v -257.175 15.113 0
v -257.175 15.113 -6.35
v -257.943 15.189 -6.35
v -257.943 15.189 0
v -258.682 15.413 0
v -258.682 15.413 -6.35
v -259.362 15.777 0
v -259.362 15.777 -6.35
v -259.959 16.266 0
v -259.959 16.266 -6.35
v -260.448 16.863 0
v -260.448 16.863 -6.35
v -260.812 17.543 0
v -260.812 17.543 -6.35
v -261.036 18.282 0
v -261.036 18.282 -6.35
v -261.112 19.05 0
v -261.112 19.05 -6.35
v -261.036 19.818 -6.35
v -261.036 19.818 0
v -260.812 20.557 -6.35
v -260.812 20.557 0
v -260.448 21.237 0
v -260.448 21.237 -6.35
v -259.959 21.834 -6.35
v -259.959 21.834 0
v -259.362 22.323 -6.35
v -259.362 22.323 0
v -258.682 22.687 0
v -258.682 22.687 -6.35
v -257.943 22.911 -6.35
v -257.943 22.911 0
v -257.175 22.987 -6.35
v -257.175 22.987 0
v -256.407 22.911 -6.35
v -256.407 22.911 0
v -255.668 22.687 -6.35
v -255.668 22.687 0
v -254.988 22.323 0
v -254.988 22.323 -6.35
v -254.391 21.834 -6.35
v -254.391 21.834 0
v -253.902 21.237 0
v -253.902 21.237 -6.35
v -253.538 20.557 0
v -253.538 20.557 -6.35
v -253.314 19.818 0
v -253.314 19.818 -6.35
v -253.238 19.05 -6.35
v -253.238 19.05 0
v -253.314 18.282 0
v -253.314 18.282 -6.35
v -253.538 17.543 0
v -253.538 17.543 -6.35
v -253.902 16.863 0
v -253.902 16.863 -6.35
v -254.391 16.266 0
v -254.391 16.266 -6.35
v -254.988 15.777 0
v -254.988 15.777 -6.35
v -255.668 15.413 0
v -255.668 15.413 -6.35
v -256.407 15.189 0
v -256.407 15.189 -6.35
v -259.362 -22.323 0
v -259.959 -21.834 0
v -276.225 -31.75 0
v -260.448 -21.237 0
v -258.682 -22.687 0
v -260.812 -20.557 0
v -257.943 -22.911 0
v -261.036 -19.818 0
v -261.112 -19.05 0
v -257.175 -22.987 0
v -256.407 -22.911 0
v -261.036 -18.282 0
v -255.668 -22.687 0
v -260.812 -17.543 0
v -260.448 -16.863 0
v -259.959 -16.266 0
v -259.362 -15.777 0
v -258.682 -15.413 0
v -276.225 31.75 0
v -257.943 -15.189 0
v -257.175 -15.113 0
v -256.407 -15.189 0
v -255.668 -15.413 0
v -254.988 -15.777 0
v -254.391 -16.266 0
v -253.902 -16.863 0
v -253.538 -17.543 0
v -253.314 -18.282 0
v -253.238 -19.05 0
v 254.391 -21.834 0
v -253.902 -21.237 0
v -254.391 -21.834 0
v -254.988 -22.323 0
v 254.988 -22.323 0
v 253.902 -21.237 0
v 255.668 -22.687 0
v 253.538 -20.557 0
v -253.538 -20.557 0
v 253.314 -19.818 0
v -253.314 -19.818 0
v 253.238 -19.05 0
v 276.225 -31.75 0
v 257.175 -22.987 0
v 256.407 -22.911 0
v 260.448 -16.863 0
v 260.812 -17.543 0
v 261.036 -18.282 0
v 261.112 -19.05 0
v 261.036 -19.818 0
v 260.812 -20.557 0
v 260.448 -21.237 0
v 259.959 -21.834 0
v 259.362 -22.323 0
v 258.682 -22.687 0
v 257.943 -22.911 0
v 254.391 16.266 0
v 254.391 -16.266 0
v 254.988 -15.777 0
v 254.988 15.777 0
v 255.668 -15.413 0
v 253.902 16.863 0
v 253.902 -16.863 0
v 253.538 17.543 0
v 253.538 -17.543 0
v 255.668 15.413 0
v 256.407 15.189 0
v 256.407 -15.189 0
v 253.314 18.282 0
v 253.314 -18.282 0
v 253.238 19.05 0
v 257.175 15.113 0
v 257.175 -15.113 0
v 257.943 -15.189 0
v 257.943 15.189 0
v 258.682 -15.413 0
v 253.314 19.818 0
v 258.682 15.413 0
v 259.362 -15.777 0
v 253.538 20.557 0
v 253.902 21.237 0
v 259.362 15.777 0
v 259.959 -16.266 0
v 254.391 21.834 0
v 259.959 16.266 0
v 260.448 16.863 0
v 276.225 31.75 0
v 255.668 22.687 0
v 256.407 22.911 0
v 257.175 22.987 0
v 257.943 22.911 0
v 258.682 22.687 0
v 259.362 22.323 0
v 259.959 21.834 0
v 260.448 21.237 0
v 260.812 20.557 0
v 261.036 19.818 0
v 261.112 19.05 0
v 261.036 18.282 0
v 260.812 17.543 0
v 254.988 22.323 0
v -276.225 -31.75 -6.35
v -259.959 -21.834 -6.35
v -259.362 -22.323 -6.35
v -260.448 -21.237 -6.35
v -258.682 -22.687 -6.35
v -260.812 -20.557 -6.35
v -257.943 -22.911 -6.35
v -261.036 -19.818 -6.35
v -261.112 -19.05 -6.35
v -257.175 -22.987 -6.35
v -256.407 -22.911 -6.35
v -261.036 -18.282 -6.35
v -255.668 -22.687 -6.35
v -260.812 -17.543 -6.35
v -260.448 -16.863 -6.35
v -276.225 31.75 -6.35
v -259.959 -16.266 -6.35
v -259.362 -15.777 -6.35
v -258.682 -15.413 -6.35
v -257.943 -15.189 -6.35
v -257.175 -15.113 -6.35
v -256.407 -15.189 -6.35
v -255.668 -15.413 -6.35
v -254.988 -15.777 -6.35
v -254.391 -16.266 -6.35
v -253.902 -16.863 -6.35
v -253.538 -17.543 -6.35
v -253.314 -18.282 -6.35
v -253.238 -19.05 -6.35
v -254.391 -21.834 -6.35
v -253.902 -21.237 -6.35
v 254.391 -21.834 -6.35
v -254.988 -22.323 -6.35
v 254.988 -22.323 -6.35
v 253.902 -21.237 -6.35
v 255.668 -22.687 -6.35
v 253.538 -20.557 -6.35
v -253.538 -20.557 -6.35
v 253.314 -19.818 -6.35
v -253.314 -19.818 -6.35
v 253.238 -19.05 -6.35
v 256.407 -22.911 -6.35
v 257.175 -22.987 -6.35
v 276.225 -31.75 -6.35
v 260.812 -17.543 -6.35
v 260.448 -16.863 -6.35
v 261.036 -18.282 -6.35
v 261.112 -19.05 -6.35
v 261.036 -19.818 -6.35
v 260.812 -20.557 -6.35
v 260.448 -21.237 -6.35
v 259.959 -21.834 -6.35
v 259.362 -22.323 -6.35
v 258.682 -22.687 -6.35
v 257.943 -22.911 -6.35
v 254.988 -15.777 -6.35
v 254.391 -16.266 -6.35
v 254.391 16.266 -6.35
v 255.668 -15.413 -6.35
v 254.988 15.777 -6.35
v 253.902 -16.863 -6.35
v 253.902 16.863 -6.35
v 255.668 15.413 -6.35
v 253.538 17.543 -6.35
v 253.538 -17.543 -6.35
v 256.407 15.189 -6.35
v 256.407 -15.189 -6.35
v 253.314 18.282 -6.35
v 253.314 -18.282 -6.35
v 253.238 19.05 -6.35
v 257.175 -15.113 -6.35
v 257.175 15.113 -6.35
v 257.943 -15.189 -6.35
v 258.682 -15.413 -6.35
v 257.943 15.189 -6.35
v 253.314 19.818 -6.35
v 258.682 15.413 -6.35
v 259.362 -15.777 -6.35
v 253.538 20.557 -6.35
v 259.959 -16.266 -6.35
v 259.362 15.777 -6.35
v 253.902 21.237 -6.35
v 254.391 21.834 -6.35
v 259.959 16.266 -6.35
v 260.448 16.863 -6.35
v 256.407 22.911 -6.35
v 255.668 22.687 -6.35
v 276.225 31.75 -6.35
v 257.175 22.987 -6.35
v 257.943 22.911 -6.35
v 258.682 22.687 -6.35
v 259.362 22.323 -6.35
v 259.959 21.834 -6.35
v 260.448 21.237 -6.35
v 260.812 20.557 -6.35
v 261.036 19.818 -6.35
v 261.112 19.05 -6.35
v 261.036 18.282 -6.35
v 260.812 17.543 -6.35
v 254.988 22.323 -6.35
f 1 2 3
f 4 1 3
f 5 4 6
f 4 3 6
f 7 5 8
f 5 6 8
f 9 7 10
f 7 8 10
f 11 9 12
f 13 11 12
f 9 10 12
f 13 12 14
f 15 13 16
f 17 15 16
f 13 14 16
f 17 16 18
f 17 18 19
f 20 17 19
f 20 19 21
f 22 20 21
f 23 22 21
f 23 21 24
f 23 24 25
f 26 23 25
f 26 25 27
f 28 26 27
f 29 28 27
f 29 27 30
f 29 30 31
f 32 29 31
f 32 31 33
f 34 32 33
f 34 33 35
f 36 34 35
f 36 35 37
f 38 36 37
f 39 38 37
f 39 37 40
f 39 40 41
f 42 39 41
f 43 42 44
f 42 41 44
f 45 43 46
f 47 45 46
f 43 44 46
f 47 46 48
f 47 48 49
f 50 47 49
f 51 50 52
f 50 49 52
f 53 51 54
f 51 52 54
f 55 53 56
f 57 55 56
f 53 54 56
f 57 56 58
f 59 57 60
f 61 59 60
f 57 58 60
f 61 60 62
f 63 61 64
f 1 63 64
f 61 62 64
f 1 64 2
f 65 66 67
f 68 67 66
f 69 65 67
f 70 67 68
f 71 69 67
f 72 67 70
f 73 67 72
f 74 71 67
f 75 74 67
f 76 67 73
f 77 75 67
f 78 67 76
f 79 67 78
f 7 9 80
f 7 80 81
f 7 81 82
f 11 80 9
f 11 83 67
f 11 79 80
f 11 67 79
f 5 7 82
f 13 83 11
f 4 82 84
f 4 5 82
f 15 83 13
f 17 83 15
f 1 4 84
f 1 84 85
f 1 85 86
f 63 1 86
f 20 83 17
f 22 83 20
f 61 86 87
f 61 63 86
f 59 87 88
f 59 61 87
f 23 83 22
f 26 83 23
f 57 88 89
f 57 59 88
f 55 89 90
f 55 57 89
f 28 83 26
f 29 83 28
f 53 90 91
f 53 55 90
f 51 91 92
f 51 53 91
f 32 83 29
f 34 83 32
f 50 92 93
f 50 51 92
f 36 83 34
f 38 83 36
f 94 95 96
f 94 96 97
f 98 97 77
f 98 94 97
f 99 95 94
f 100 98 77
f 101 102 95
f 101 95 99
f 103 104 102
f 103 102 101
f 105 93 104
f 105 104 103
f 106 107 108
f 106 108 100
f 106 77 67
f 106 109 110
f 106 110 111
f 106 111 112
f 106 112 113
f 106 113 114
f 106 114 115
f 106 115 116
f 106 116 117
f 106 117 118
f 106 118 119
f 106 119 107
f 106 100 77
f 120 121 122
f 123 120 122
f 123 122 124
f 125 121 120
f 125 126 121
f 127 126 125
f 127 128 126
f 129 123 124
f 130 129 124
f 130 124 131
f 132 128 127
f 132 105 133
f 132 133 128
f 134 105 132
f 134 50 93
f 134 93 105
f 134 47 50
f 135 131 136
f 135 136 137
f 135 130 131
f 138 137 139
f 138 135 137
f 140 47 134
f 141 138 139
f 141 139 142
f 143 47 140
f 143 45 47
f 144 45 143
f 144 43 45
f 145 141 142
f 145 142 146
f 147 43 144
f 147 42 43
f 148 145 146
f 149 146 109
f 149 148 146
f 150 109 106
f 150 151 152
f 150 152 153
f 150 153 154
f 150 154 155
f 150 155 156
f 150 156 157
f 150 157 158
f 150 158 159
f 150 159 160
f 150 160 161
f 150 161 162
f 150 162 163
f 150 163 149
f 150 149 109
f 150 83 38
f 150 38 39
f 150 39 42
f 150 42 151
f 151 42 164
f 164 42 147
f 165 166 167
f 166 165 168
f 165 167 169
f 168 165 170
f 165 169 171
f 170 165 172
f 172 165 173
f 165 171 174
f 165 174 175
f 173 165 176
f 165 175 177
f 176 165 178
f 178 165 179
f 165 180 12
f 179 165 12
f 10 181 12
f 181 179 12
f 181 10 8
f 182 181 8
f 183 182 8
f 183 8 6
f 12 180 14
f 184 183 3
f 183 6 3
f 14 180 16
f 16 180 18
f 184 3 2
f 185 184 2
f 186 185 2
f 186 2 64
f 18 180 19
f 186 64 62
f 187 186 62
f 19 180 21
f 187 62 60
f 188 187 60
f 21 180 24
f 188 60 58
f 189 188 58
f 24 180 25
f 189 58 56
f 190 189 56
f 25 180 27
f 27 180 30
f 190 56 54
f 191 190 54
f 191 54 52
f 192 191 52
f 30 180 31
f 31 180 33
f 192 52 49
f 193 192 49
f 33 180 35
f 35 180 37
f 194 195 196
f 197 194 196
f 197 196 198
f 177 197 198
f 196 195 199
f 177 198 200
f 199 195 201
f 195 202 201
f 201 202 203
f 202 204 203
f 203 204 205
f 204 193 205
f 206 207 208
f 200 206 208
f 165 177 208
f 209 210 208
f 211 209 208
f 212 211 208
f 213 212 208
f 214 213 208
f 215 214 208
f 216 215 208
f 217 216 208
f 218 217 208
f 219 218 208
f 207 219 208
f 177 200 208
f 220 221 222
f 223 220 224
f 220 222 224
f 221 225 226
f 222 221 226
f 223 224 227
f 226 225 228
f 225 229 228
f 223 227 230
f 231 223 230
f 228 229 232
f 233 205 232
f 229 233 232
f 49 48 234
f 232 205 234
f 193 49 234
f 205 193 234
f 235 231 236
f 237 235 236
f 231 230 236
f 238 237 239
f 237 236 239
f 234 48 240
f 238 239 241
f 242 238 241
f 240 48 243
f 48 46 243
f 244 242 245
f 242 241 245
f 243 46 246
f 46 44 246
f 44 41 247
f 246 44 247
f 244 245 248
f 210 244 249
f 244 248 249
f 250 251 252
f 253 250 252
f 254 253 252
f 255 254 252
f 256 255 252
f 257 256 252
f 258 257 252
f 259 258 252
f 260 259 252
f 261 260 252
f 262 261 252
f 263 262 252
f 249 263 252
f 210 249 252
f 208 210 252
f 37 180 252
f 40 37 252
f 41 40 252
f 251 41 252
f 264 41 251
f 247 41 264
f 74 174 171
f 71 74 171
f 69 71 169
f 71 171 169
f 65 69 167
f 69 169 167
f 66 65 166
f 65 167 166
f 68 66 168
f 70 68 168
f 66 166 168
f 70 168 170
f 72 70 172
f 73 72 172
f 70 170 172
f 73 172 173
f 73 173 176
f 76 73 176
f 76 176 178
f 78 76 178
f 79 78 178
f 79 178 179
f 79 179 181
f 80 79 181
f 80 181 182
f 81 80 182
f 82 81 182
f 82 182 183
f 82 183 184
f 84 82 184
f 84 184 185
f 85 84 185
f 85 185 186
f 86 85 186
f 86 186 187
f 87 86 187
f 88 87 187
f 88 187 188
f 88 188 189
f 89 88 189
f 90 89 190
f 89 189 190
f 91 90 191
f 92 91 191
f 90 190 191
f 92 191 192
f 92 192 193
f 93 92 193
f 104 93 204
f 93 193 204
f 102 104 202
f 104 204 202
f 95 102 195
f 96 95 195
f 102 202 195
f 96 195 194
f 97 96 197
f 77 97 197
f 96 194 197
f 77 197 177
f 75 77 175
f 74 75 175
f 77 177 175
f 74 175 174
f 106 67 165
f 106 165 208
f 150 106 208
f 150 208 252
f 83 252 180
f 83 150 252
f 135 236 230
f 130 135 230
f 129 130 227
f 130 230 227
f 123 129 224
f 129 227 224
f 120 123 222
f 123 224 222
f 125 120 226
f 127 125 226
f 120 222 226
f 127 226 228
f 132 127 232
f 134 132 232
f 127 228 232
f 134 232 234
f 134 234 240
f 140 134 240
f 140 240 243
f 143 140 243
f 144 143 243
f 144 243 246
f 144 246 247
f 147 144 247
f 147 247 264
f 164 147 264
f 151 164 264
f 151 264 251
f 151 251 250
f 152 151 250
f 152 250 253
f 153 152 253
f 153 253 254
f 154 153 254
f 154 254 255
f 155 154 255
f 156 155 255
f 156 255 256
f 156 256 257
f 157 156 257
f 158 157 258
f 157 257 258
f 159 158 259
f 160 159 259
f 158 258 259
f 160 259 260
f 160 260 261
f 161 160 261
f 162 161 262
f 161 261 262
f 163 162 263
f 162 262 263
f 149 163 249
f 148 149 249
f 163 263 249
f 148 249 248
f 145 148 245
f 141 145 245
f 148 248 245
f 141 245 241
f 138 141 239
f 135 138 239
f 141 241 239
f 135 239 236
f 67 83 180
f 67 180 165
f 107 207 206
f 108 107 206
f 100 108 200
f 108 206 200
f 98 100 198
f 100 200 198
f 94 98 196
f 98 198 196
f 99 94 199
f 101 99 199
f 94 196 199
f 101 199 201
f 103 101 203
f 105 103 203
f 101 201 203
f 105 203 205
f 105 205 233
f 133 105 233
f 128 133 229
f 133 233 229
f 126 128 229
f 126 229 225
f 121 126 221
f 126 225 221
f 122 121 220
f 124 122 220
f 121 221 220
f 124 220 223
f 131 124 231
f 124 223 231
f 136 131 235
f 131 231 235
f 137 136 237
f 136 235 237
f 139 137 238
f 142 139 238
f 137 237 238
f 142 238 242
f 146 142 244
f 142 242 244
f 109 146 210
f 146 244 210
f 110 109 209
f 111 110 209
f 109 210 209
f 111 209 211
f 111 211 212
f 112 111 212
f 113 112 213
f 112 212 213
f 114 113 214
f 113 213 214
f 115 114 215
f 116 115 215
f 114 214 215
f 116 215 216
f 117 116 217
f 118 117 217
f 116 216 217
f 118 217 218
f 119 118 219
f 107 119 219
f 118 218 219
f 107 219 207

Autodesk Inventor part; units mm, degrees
ref_plane "YZ Plane" through (0, 0, 0) normal (1, 0, 0) x (0, 1, 0)
ref_plane "XZ Plane" through (0, 0, 0) normal (0, 1, 0) x (-1, 0, 0)
ref_plane "XY Plane" through (0, 0, 0) normal (0, 0, 1) x (1, 0, 0)
sketch "Sketch1" plane through (0, 0, 0) normal (0, 0, 1) x (1, 0, 0)
  line L0 (-276.225, -31.75) -> (276.225, -31.75)
  line L1 (276.225, -31.75) -> (276.225, 31.75)
  line L2 (276.225, 31.75) -> (-276.225, 31.75)
  line L3 (-276.225, 31.75) -> (-276.225, -31.75)
  line L4 (-276.225, -31.75) -> (276.225, 31.75) construction
  line L5 (276.225, -31.75) -> (-276.225, 31.75) construction
  point P0 (0, 0)
  dimension "d0" = 552.45
  dimension "d1" = 63.5
extrude "Extrusion1" add sketch "Sketch1" against normal blind 6.35
sketch "Sketch2" plane through (0, 0, 0) normal (0, 0, 1) x (1, 0, 0)
  line L0 (276.225, 31.75) -> (-276.225, 31.75) projected
  line L1 (-276.225, 31.75) -> (-276.225, -31.75) projected
  point P0 (0, 0)
  point P1 (-257.175, 19.05)
  point P2 (-257.175, -19.05)
  point P3 (257.175, 19.05)
  point P4 (257.175, -19.05)
  dimension "d4" = 19.05
  dimension "d5" = 12.7
  dimension "d6" = 50.8
  dimension "d8" = 533.4
hole "Hole1" at (-257.175, 19.05, 0) at (-257.175, -19.05, 0) at (257.175, 19.05, 0) at (257.175, -19.05, 0) direction (0, 0, -1) diameter 7.874 end through all
ref_plane "Work Plane1" through (0, 31.75, 0) normal (-1, 0, 0) x (0, -1, 0)
properties part number "GE-13041" material "Polycarbonate, Clear"
